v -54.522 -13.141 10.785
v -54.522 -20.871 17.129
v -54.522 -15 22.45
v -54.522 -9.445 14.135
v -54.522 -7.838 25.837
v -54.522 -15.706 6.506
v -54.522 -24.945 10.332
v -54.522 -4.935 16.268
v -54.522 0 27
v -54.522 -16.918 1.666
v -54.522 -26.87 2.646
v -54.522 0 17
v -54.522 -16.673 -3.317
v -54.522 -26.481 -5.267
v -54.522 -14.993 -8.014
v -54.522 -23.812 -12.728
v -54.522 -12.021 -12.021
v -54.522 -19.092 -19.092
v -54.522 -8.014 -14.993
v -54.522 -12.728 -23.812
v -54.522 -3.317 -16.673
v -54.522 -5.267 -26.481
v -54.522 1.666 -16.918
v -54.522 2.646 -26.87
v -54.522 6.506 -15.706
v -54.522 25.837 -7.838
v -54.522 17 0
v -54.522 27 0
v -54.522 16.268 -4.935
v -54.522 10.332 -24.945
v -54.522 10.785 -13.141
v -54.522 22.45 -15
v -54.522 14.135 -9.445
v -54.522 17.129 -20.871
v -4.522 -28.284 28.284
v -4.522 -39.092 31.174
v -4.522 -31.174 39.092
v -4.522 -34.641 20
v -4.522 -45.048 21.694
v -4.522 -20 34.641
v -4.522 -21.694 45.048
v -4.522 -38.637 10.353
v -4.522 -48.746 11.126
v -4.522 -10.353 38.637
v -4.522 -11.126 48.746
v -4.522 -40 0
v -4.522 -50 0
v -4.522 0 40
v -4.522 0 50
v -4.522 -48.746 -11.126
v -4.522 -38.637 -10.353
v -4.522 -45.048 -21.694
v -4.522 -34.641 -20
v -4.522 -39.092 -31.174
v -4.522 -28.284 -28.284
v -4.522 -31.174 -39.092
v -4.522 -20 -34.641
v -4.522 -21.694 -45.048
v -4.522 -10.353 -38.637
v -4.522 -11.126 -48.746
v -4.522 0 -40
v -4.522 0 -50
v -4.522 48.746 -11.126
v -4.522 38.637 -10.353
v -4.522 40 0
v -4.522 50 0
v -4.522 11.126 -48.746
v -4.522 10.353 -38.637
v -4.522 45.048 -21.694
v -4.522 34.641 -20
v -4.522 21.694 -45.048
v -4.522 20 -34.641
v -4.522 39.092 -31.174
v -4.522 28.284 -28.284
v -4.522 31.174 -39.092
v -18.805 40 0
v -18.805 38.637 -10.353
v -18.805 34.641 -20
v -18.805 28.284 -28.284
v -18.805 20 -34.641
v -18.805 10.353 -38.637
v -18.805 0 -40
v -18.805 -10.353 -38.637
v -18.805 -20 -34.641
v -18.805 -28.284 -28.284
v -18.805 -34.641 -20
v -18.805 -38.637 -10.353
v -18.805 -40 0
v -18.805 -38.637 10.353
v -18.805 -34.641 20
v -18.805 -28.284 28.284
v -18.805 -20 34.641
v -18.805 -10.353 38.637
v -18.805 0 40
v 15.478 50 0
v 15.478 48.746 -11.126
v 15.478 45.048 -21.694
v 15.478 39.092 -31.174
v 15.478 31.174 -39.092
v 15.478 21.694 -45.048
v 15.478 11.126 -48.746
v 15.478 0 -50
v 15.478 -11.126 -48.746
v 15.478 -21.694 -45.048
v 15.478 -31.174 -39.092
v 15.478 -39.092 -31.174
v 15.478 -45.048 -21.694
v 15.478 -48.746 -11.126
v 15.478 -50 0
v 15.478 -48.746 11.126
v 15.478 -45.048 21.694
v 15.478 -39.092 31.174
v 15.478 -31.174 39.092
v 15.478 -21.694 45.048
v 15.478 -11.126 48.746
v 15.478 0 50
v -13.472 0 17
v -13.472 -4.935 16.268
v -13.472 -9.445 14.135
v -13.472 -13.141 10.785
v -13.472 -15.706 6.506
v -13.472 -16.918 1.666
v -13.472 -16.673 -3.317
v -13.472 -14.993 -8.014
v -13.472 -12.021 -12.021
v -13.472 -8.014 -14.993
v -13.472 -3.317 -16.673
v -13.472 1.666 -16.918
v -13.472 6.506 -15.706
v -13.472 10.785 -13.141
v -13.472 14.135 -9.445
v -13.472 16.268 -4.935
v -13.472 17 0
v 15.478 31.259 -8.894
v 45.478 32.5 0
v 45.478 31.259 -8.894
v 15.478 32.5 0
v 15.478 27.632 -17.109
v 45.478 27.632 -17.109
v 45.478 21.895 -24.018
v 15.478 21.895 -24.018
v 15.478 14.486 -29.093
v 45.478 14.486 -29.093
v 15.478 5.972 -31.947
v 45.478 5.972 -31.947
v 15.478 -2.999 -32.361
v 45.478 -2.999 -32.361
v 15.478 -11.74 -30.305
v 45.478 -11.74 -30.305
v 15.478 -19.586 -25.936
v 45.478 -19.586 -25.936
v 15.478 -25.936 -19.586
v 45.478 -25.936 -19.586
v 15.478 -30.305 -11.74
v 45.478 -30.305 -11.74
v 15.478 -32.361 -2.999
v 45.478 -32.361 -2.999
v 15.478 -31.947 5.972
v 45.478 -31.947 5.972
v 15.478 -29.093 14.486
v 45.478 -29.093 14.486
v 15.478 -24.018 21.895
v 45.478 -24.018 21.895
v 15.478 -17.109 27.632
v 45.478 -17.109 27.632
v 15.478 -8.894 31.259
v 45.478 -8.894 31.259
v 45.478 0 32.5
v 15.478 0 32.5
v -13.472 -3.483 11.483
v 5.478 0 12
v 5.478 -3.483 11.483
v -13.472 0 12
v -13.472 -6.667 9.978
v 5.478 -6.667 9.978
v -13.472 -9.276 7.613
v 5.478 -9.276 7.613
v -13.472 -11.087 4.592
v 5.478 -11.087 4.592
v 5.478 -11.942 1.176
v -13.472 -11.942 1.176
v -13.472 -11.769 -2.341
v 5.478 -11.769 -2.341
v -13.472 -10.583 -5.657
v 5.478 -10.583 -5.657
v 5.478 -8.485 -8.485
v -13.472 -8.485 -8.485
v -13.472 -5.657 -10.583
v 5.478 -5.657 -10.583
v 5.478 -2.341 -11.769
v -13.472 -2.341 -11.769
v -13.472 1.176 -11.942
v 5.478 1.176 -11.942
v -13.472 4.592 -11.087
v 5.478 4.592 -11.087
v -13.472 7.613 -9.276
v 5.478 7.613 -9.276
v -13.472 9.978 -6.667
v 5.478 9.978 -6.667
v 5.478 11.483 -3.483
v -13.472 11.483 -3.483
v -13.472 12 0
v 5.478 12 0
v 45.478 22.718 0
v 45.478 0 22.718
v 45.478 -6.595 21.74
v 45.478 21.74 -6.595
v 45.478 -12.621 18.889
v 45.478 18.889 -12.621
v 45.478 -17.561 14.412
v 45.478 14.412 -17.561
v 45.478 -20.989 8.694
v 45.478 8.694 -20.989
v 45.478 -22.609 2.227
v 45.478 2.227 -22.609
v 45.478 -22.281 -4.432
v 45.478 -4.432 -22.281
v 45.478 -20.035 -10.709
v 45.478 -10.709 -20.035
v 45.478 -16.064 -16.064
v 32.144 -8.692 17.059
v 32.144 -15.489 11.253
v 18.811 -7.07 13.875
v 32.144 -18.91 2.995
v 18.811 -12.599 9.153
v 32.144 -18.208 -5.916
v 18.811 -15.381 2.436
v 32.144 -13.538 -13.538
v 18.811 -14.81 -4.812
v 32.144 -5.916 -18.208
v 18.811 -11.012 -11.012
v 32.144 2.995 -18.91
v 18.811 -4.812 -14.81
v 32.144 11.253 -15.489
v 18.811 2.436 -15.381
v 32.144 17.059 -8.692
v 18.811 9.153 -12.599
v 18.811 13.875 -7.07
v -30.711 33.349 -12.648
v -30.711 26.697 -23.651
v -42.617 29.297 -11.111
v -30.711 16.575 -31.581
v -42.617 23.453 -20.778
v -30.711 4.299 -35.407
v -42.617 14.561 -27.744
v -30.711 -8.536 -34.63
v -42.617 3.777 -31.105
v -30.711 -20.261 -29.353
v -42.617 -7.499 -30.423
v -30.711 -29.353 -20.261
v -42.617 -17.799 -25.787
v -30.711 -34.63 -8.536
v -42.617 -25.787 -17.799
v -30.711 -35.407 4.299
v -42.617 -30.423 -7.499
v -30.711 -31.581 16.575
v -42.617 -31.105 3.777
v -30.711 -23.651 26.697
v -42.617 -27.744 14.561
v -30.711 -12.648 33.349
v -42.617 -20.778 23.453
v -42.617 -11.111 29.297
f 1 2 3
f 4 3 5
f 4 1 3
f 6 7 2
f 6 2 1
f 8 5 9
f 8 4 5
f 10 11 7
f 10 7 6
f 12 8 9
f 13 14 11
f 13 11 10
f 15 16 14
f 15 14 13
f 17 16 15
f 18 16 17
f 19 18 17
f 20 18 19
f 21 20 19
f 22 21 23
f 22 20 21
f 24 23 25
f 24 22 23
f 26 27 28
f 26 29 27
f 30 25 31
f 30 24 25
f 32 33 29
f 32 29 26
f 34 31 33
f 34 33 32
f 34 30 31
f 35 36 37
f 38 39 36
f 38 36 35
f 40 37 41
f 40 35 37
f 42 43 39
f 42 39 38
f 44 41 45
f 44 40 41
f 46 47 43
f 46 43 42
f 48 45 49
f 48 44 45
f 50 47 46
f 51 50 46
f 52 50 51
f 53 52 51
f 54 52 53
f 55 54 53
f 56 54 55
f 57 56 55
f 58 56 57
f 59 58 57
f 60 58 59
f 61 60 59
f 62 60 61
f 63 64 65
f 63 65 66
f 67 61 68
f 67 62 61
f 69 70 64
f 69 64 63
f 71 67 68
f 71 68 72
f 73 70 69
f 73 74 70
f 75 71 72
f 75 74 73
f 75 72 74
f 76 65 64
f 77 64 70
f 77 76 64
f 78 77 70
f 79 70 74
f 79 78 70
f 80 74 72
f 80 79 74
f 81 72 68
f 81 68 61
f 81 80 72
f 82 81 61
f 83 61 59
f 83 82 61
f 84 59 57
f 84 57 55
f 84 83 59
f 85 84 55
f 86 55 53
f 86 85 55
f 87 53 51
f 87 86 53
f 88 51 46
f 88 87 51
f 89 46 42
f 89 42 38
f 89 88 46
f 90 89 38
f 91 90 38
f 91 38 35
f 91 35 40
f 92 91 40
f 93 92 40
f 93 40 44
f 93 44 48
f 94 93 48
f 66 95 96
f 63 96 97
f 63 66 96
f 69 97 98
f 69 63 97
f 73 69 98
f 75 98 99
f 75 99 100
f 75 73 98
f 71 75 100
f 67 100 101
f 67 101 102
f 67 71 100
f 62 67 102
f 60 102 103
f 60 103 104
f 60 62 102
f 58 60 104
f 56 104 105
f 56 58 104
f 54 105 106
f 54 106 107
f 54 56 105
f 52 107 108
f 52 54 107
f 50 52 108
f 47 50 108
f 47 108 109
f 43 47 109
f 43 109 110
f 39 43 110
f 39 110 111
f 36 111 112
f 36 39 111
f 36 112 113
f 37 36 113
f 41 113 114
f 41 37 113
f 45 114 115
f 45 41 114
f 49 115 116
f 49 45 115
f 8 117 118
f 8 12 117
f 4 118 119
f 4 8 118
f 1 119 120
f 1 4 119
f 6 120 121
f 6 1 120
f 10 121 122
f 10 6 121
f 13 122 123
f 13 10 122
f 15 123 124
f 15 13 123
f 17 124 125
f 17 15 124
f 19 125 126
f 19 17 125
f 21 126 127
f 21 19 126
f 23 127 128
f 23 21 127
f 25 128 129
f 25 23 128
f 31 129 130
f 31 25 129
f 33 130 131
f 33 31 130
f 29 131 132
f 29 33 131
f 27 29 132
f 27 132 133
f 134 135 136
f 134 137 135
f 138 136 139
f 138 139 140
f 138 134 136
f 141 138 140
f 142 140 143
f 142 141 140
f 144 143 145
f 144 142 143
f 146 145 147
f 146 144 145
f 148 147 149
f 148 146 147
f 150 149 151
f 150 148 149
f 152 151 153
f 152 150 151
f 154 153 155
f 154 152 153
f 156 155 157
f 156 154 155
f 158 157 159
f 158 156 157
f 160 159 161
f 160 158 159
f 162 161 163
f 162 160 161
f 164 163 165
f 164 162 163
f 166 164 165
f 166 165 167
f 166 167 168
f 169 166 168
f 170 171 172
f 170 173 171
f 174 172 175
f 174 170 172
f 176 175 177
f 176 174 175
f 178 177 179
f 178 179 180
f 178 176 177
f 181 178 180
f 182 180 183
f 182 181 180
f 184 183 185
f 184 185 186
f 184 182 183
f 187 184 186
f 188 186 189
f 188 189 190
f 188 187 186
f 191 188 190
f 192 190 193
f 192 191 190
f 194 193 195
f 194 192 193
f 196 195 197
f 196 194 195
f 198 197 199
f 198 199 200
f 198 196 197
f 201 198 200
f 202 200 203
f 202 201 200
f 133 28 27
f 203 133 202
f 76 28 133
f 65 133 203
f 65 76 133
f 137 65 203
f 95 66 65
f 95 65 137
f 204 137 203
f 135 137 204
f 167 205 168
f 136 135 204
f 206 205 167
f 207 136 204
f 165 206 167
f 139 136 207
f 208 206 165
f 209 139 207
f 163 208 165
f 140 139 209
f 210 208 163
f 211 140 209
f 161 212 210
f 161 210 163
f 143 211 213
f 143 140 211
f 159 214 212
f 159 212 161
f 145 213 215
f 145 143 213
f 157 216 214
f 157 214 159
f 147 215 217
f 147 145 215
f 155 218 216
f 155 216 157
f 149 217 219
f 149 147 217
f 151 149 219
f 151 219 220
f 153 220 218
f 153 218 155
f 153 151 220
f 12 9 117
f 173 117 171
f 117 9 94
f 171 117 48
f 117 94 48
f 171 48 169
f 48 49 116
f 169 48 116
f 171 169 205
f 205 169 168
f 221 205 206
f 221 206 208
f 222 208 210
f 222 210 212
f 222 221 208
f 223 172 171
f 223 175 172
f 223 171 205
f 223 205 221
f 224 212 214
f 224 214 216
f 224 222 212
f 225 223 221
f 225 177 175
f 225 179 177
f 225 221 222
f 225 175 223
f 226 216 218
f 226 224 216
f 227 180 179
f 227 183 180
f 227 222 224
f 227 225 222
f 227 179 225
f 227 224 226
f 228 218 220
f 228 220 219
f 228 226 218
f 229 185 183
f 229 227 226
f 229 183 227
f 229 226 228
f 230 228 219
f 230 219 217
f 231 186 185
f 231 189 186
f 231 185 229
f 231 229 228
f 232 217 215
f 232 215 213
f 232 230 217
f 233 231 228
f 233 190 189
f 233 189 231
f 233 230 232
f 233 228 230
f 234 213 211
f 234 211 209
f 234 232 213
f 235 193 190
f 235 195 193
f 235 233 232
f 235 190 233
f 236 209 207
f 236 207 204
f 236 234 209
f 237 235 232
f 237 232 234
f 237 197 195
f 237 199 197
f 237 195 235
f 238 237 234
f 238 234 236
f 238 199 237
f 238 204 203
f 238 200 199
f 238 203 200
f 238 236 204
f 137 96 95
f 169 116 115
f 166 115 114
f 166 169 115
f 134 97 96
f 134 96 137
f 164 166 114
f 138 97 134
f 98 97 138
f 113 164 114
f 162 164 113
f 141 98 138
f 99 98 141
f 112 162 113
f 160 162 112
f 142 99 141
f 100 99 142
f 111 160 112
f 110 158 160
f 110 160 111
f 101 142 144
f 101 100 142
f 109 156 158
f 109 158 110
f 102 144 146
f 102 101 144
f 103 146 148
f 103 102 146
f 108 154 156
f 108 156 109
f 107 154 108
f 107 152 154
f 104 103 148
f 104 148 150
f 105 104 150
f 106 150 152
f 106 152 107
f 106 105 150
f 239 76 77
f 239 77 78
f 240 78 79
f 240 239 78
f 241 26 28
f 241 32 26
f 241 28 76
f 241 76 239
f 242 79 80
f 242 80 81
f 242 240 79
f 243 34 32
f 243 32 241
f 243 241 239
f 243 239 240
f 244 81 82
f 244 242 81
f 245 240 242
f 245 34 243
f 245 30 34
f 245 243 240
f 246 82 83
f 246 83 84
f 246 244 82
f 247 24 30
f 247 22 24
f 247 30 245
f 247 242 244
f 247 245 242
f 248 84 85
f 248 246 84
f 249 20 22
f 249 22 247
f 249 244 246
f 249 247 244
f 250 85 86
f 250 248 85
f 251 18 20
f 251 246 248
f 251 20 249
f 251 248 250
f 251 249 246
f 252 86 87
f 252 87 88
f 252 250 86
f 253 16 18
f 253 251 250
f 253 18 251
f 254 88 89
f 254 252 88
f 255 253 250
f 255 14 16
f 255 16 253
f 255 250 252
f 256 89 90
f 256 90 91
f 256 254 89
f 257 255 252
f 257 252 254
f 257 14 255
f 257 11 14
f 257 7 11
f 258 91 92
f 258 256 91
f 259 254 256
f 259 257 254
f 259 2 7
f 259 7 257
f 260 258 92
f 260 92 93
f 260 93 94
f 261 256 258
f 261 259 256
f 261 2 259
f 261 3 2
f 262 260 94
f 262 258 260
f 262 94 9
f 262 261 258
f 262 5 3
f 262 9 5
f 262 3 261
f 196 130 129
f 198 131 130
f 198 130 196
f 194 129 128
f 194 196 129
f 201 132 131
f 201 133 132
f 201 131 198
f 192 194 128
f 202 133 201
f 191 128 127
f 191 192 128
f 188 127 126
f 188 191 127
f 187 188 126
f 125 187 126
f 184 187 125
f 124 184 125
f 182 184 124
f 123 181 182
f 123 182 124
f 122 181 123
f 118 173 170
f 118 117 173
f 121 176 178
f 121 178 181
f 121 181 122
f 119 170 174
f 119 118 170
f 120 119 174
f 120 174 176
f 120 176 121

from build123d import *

# Parameters (mm, degrees)
REVOLVE1_ANGLE = 270


with BuildPart() as part:
    # Sketch2 → Revolve1 (revolve)
    with BuildSketch(Plane.XY):
        Polygon((-54.522496773, 27), (-54.522496773, 0), (45.477503227, 0), (45.477503227, 32.5), (15.477503227, 32.5), (15.477503227, 50), (-4.522496773, 50), (-4.522496773, 40), (-18.80529032, 40), align=None)
    revolve(axis=Axis((88.99, 0, 0), (-1, 0, 0)), revolution_arc=REVOLVE1_ANGLE)

    # Sketch3 → Cut-Revolve1 (revolve, cut)
    with BuildSketch(Plane.XY):
        Polygon((-54.522496773, 0), (45.477503227, 0), (45.477503227, 22.717967697), (5.477503227, 12), (-13.471731936, 12), (-13.471731936, 17), (-54.522496773, 17), align=None)
    revolve(axis=Axis((-54.522496773, 0, 0), (1, 0, 0)), mode=Mode.SUBTRACT)


solid = part.part
